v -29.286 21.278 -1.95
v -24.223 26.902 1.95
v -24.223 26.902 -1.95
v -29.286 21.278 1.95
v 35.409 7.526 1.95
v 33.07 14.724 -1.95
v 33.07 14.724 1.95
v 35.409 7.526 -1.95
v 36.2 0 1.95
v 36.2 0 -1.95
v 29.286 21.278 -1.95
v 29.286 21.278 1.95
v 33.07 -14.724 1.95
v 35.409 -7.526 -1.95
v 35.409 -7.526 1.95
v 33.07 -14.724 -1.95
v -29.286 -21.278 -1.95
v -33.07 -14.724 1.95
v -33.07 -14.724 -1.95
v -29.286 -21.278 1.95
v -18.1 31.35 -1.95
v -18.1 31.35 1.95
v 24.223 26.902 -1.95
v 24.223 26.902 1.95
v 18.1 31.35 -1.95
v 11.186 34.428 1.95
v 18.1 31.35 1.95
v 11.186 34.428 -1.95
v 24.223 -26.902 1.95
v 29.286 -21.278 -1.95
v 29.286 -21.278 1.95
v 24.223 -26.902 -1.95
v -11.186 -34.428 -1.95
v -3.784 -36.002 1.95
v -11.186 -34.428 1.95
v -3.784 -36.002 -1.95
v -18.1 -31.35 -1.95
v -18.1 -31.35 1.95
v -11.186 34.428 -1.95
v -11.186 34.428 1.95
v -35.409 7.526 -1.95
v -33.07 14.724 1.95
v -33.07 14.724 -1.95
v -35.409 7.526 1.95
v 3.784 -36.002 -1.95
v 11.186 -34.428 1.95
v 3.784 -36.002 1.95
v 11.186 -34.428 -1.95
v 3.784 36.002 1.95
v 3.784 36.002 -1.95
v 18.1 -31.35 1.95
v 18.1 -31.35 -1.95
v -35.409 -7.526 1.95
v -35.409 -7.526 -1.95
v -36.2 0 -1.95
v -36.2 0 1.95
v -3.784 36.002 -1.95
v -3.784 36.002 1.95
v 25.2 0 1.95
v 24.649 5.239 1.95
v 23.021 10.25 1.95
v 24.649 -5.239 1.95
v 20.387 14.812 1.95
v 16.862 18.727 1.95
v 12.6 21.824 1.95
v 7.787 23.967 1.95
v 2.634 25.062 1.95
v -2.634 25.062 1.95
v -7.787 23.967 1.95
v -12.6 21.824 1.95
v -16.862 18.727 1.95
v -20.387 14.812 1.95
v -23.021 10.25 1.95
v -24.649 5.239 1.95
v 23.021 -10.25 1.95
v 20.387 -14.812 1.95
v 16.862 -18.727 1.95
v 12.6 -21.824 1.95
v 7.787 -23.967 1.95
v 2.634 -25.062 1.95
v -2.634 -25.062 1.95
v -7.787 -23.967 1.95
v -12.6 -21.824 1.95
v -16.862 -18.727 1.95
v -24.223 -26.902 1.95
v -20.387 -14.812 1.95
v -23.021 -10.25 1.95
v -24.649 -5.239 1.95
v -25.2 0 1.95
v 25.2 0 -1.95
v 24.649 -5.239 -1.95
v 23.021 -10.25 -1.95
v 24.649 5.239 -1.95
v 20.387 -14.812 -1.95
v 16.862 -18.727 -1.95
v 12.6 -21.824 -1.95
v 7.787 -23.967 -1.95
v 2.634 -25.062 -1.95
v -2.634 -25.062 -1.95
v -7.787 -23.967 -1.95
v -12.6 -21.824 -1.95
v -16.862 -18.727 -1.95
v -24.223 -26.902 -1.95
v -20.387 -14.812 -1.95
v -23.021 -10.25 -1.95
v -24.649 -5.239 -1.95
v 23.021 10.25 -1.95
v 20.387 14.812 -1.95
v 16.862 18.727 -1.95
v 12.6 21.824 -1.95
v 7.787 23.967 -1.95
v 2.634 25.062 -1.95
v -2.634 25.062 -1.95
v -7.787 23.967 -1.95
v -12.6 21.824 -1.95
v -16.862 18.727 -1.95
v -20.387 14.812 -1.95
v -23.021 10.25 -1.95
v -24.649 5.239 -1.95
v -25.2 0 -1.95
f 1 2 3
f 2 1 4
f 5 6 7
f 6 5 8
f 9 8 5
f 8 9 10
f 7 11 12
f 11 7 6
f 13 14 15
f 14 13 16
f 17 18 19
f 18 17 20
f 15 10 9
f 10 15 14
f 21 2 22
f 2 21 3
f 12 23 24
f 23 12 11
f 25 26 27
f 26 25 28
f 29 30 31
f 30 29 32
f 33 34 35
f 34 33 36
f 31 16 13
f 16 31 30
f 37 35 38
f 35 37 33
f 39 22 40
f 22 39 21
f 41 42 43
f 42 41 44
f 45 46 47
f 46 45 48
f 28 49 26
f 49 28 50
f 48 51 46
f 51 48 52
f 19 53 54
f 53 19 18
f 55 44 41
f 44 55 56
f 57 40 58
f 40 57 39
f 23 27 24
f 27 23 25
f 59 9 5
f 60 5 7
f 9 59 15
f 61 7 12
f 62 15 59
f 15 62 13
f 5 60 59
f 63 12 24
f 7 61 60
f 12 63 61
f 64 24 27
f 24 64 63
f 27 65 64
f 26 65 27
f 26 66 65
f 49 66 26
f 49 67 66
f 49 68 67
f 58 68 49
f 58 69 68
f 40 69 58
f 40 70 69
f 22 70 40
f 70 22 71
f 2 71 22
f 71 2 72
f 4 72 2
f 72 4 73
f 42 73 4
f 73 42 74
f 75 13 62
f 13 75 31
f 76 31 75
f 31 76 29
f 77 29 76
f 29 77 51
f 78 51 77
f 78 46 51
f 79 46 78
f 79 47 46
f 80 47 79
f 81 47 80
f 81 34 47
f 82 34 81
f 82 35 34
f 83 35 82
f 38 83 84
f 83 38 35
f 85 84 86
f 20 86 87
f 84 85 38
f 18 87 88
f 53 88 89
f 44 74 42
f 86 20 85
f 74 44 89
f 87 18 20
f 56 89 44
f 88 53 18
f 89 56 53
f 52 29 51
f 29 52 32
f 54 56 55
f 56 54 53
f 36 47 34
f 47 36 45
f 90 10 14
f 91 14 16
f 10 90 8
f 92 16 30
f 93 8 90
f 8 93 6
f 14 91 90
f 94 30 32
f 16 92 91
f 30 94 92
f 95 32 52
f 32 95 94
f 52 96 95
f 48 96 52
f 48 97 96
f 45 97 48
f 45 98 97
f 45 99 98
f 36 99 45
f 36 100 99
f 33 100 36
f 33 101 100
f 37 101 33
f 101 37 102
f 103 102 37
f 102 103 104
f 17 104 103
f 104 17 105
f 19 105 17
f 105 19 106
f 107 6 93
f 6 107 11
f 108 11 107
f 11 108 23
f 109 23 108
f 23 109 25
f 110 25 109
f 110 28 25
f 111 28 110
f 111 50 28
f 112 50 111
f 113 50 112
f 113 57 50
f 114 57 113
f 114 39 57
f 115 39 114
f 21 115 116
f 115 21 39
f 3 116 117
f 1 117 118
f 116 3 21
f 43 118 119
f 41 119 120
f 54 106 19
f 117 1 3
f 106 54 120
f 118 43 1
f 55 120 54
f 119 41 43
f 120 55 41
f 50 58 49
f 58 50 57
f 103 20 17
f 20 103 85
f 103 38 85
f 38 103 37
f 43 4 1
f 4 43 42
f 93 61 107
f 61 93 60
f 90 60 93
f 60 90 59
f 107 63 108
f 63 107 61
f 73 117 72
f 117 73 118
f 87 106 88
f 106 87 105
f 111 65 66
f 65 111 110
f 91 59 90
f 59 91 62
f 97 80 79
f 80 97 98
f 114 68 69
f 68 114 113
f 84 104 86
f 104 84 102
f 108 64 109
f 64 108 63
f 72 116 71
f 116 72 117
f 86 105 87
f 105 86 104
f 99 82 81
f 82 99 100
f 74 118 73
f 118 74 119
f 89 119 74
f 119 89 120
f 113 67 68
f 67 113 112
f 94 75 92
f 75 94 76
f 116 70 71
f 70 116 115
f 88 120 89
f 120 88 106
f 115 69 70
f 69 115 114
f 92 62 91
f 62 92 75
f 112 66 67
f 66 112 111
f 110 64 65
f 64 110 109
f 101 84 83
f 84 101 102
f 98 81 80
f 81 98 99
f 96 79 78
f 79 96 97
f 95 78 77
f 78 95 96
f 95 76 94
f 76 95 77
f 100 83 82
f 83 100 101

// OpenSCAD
// ring for twitch's game. it's a cylindrical hole, where the
// outside of the torus is tapered top and bottom.

h = 3.9;    // height
od = 36.2;  // outer diameter
id = 25.2;  // inner diameter

difference(){
	union(){
		cylinder(h, od, od, true);
		
	}
	cylinder(h, id, id, true);
}
